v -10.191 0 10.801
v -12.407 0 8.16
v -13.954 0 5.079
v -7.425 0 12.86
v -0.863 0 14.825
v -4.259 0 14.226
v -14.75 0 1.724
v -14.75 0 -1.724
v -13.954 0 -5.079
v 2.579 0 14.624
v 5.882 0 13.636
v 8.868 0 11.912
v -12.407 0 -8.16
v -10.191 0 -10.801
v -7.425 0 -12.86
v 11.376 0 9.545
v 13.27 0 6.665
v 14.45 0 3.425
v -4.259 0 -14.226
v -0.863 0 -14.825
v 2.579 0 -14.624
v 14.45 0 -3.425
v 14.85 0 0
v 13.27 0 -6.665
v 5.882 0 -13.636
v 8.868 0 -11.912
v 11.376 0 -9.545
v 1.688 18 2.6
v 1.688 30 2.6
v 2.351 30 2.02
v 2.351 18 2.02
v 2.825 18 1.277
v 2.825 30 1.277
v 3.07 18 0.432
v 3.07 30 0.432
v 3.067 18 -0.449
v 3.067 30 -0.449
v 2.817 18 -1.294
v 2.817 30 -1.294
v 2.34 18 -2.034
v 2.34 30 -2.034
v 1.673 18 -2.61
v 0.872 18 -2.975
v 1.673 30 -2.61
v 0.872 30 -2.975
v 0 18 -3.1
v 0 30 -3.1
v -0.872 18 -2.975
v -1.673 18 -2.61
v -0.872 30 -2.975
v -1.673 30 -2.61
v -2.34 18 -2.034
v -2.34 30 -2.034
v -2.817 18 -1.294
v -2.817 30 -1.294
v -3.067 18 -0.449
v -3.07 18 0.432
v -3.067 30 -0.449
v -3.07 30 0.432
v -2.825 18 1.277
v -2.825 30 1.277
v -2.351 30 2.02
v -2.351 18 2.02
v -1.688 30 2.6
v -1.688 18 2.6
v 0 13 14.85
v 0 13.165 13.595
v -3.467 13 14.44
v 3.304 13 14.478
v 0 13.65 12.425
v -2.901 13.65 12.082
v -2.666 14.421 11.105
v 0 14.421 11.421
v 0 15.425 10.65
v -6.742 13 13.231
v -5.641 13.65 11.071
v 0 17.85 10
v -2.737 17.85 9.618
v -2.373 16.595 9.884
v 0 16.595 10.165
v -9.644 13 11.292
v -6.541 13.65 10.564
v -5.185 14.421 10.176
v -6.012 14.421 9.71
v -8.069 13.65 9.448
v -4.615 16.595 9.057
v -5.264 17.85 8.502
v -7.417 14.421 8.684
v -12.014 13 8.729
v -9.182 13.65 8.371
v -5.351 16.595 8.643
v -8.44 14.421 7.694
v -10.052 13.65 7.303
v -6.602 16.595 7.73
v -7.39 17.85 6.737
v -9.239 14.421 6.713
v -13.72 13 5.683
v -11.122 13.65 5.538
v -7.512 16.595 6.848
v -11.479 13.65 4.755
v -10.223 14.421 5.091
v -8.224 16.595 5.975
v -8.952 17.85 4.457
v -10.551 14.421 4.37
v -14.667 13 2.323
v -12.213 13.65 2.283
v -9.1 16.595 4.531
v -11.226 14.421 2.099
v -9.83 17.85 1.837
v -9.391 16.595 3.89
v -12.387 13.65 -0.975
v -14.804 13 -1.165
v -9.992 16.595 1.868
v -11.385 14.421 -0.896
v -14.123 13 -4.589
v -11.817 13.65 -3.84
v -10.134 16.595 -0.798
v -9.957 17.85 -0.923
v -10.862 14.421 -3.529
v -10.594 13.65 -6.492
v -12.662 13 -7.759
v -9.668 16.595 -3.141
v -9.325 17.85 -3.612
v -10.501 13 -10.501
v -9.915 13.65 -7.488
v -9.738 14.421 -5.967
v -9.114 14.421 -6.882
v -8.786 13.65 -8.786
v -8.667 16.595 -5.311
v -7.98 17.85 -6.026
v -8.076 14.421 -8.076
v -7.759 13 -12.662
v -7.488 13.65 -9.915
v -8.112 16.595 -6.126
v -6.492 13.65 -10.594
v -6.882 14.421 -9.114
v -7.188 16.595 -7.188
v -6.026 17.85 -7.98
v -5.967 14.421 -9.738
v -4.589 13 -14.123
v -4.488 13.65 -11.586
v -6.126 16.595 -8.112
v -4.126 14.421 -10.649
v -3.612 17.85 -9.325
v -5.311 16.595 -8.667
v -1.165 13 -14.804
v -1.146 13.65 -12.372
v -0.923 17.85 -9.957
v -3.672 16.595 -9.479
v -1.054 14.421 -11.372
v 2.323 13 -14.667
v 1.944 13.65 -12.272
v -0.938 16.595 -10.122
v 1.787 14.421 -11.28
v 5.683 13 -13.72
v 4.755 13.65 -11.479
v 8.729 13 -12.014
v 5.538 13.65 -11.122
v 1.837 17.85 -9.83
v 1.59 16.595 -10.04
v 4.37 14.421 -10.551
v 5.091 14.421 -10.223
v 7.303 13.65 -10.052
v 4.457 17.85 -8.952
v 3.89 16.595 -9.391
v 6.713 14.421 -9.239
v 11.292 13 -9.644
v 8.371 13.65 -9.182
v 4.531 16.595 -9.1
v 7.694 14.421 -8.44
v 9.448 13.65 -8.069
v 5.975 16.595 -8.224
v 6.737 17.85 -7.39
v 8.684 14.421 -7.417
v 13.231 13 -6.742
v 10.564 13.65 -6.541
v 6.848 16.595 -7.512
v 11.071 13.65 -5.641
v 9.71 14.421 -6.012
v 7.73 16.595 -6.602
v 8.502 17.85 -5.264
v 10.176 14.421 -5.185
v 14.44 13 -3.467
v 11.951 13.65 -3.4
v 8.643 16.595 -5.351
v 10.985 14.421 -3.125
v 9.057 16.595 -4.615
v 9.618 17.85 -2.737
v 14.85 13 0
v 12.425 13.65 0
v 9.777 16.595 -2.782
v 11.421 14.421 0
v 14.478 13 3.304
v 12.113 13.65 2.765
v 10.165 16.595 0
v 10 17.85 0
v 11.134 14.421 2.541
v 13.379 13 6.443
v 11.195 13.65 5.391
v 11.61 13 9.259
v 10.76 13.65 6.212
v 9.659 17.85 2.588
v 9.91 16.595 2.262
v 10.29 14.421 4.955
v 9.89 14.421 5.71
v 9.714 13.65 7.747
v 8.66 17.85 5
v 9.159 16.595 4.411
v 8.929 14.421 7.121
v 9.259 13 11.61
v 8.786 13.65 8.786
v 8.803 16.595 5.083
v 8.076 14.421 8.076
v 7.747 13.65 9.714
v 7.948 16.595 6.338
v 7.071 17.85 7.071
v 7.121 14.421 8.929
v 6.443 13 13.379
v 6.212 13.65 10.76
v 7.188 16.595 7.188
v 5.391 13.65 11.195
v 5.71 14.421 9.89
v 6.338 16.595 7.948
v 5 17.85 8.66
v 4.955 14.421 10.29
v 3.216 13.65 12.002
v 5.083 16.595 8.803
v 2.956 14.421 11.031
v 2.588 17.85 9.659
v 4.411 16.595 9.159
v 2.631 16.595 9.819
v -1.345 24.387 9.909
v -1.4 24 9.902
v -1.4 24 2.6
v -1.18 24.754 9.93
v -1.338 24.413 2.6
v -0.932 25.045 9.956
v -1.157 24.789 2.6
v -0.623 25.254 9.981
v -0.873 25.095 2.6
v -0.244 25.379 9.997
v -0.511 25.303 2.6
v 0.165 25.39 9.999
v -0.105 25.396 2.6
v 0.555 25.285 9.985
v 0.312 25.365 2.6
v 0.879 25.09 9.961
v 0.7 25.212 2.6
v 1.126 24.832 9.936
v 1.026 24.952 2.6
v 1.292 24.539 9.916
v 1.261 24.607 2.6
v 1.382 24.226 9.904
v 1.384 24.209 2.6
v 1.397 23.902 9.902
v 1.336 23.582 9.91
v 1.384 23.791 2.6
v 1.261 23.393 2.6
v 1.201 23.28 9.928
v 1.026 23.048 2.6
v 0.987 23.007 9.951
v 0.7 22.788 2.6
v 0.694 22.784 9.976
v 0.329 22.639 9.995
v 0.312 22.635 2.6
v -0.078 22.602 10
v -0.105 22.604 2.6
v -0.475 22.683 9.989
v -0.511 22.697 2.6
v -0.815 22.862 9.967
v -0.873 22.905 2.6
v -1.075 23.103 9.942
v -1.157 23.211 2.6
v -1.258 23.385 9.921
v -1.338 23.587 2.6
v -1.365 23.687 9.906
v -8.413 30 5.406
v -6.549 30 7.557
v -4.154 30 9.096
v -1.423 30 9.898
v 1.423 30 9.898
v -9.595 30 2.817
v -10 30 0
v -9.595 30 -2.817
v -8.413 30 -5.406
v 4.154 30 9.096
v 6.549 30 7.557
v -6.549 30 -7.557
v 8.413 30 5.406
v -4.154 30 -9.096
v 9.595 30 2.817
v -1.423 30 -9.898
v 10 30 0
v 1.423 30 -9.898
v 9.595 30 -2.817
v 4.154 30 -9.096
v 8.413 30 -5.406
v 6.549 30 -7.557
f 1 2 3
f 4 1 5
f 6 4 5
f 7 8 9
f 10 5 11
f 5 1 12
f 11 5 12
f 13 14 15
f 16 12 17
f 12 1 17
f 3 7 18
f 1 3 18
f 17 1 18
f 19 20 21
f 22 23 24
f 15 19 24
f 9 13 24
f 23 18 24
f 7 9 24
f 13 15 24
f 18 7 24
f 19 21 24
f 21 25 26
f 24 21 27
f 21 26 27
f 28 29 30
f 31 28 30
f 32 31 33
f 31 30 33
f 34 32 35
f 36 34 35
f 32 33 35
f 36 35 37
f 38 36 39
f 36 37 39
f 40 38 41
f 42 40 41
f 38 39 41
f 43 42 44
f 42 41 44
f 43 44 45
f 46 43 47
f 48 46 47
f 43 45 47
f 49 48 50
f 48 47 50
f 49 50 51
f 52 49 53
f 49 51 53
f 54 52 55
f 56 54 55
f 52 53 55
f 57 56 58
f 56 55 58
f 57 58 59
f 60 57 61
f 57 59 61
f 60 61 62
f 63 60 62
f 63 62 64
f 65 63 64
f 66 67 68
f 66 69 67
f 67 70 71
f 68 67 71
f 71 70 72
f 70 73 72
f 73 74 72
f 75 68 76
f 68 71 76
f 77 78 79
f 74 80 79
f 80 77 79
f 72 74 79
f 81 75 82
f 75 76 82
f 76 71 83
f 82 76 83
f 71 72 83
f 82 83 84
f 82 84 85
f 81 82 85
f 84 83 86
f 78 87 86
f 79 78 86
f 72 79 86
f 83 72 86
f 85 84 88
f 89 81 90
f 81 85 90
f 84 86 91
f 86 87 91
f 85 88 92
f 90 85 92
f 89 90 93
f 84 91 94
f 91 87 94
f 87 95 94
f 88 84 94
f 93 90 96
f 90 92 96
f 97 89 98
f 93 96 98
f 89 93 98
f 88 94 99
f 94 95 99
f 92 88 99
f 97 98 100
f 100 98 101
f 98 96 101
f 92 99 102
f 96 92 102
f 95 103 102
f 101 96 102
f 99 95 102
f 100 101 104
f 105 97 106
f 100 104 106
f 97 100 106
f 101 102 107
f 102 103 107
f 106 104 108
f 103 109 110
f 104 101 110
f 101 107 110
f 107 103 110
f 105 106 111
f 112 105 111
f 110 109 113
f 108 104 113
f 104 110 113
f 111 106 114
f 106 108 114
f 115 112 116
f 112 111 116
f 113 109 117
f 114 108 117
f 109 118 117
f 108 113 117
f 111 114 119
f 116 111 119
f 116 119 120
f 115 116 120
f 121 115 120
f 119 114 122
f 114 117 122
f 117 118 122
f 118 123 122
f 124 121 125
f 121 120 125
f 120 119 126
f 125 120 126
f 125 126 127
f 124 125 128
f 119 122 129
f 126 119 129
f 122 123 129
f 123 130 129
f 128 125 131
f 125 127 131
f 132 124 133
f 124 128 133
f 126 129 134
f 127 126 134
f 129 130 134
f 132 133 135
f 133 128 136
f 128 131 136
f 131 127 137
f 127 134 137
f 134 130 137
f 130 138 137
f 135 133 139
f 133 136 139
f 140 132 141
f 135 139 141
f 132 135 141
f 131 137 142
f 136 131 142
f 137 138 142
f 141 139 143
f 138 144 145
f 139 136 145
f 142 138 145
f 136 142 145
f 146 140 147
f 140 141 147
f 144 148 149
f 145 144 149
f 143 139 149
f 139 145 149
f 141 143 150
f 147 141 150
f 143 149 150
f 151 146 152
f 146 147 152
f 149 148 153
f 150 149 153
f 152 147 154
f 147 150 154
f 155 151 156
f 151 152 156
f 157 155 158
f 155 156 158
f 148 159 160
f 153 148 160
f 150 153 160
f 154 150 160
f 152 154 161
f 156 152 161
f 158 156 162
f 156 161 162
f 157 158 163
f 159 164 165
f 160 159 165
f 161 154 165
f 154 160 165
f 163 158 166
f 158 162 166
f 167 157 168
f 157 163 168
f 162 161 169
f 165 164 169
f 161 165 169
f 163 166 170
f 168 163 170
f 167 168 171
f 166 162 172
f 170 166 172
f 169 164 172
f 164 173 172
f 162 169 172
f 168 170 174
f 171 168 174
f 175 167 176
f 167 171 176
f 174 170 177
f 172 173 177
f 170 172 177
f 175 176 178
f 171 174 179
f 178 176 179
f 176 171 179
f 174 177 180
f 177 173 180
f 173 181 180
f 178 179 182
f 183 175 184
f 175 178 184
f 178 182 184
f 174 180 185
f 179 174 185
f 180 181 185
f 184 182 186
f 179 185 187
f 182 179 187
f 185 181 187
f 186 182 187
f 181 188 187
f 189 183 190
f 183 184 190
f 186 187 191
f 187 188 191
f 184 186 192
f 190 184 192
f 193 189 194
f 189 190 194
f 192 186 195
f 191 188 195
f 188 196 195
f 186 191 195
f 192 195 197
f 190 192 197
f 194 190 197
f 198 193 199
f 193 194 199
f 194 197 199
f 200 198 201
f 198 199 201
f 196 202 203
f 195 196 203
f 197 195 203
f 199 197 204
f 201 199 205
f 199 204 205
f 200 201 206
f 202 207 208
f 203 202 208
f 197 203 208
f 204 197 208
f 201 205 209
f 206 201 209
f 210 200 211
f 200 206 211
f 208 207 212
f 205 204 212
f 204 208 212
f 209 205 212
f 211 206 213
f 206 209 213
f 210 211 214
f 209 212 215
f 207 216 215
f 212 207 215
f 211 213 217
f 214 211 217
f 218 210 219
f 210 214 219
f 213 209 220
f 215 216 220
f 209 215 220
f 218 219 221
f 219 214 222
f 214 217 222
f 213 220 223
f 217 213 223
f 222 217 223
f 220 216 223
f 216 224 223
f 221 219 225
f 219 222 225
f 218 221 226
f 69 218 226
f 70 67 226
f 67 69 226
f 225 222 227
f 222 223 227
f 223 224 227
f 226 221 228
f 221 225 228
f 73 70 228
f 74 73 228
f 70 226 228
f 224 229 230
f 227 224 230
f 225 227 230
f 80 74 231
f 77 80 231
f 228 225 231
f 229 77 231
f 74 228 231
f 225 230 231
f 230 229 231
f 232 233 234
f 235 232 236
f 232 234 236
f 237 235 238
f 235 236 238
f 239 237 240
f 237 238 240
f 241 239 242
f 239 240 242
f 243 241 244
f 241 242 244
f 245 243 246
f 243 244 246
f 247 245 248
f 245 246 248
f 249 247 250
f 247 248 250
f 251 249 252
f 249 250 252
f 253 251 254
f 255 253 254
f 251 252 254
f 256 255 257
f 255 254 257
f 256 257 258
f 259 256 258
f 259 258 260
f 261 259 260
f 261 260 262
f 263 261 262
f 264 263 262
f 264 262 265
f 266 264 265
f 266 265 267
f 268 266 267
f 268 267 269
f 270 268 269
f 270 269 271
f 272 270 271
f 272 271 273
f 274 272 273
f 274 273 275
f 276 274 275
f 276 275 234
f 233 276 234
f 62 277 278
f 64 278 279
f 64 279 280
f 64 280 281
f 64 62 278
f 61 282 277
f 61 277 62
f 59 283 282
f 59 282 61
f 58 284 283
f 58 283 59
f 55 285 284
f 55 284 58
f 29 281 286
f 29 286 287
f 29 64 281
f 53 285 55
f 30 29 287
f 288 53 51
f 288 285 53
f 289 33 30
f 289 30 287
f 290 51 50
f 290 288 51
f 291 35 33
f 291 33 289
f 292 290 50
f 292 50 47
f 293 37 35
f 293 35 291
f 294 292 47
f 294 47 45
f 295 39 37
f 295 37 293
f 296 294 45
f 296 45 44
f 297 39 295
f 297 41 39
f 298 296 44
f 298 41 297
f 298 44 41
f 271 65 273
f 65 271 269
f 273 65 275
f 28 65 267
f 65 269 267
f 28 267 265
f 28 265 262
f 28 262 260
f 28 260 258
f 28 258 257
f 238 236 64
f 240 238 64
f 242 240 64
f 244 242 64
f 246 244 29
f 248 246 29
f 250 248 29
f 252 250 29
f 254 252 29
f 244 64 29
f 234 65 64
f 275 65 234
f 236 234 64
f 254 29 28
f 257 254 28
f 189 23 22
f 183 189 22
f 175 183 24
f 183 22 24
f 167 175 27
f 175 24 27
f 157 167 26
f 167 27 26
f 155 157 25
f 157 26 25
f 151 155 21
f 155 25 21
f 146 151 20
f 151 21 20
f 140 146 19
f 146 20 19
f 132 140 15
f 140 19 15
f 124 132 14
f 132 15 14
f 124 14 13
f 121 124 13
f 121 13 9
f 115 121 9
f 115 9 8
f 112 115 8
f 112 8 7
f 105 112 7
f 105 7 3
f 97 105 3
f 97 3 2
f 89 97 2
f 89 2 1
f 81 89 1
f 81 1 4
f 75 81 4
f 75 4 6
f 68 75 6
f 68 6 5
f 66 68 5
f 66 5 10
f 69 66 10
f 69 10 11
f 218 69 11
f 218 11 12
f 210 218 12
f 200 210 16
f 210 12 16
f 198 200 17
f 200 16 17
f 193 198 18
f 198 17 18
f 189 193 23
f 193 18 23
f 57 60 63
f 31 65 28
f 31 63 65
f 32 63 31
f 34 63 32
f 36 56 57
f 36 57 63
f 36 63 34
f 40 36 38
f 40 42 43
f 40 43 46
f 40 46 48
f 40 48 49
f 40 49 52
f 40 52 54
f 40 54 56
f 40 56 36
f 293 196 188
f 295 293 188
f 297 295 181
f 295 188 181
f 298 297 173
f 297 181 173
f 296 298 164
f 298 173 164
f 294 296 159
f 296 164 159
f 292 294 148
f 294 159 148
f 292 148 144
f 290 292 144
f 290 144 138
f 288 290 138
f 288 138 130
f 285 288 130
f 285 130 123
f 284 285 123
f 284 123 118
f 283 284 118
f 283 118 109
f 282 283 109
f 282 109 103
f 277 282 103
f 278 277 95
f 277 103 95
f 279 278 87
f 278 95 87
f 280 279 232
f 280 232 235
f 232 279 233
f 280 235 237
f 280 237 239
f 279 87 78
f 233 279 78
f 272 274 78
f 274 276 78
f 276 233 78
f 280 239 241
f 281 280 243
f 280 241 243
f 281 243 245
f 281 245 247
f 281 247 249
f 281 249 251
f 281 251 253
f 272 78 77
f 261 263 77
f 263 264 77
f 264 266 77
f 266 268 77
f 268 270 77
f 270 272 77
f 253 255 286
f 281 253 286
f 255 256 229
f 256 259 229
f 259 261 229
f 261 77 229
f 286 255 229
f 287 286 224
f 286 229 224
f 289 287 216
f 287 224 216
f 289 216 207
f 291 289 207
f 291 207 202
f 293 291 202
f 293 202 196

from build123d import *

# Parameters (mm, degrees)
SKETCH_1_R          = 14.85
EXTRUDE_1_DEPTH     = 13
SKETCH_2_R          = 10
EXTRUDE_2_DEPTH     = 17
CUT_EXTRUDE_1_DEPTH = 12
SKETCH_13_R         = 1.4
CUT_EXTRUDE_2_DEPTH = 13.25


with BuildPart() as part:
    # 스케치1 → 보스-돌출1 (new body)
    with BuildSketch(Plane(origin=(0, 0, 0), x_dir=(1, 0, 0), z_dir=(0, 1, 0))):
        Circle(SKETCH_1_R)
    extrude(amount=EXTRUDE_1_DEPTH)

    # 스케치2 → 보스-돌출2 (add)
    with BuildSketch(Plane(origin=(0, 13, 0), x_dir=(1, 0, 0), z_dir=(0, 1, 0))):
        Circle(SKETCH_2_R)
    extrude(amount=EXTRUDE_2_DEPTH)

    # 스케치4 → 컷-돌출1 (cut)
    with BuildSketch(Plane(origin=(0, 30, 0), x_dir=(1, 0, 0), z_dir=(0, 1, 0))):
        with BuildLine():
            Line((-1.688194302, -2.6), (1.688194302, -2.6))
            ThreePointArc((1.688194302, -2.6), (0, 3.1), (-1.688194302, -2.6))
        make_face()
    extrude(amount=-CUT_EXTRUDE_1_DEPTH, mode=Mode.SUBTRACT)

    # 스케치13 → 컷-돌출2 (cut, through all)
    with BuildSketch(Plane(origin=(0, 0, 2.6), x_dir=(-1, 0, 0), z_dir=(0, 0, -1))):
        with Locations((0, 24)):
            Circle(SKETCH_13_R)
    extrude(amount=-CUT_EXTRUDE_2_DEPTH, mode=Mode.SUBTRACT)

    # 스케치3 → 회전1 (revolve)
    with BuildSketch(Plane(origin=(0, 0, 0), x_dir=(0, 0, -1), z_dir=(1, 0, 0))):
        with BuildLine():
            ThreePointArc((-14.85, 13), (-11.420532111, 14.420532111), (-10, 17.85))
            Line((-10, 17.85), (-10, 13))
            Line((-10, 13), (-14.85, 13))
        make_face()
    revolve(axis=Axis((0, 34.691748642, 0), (0, -1, 0)))


solid = part.part
